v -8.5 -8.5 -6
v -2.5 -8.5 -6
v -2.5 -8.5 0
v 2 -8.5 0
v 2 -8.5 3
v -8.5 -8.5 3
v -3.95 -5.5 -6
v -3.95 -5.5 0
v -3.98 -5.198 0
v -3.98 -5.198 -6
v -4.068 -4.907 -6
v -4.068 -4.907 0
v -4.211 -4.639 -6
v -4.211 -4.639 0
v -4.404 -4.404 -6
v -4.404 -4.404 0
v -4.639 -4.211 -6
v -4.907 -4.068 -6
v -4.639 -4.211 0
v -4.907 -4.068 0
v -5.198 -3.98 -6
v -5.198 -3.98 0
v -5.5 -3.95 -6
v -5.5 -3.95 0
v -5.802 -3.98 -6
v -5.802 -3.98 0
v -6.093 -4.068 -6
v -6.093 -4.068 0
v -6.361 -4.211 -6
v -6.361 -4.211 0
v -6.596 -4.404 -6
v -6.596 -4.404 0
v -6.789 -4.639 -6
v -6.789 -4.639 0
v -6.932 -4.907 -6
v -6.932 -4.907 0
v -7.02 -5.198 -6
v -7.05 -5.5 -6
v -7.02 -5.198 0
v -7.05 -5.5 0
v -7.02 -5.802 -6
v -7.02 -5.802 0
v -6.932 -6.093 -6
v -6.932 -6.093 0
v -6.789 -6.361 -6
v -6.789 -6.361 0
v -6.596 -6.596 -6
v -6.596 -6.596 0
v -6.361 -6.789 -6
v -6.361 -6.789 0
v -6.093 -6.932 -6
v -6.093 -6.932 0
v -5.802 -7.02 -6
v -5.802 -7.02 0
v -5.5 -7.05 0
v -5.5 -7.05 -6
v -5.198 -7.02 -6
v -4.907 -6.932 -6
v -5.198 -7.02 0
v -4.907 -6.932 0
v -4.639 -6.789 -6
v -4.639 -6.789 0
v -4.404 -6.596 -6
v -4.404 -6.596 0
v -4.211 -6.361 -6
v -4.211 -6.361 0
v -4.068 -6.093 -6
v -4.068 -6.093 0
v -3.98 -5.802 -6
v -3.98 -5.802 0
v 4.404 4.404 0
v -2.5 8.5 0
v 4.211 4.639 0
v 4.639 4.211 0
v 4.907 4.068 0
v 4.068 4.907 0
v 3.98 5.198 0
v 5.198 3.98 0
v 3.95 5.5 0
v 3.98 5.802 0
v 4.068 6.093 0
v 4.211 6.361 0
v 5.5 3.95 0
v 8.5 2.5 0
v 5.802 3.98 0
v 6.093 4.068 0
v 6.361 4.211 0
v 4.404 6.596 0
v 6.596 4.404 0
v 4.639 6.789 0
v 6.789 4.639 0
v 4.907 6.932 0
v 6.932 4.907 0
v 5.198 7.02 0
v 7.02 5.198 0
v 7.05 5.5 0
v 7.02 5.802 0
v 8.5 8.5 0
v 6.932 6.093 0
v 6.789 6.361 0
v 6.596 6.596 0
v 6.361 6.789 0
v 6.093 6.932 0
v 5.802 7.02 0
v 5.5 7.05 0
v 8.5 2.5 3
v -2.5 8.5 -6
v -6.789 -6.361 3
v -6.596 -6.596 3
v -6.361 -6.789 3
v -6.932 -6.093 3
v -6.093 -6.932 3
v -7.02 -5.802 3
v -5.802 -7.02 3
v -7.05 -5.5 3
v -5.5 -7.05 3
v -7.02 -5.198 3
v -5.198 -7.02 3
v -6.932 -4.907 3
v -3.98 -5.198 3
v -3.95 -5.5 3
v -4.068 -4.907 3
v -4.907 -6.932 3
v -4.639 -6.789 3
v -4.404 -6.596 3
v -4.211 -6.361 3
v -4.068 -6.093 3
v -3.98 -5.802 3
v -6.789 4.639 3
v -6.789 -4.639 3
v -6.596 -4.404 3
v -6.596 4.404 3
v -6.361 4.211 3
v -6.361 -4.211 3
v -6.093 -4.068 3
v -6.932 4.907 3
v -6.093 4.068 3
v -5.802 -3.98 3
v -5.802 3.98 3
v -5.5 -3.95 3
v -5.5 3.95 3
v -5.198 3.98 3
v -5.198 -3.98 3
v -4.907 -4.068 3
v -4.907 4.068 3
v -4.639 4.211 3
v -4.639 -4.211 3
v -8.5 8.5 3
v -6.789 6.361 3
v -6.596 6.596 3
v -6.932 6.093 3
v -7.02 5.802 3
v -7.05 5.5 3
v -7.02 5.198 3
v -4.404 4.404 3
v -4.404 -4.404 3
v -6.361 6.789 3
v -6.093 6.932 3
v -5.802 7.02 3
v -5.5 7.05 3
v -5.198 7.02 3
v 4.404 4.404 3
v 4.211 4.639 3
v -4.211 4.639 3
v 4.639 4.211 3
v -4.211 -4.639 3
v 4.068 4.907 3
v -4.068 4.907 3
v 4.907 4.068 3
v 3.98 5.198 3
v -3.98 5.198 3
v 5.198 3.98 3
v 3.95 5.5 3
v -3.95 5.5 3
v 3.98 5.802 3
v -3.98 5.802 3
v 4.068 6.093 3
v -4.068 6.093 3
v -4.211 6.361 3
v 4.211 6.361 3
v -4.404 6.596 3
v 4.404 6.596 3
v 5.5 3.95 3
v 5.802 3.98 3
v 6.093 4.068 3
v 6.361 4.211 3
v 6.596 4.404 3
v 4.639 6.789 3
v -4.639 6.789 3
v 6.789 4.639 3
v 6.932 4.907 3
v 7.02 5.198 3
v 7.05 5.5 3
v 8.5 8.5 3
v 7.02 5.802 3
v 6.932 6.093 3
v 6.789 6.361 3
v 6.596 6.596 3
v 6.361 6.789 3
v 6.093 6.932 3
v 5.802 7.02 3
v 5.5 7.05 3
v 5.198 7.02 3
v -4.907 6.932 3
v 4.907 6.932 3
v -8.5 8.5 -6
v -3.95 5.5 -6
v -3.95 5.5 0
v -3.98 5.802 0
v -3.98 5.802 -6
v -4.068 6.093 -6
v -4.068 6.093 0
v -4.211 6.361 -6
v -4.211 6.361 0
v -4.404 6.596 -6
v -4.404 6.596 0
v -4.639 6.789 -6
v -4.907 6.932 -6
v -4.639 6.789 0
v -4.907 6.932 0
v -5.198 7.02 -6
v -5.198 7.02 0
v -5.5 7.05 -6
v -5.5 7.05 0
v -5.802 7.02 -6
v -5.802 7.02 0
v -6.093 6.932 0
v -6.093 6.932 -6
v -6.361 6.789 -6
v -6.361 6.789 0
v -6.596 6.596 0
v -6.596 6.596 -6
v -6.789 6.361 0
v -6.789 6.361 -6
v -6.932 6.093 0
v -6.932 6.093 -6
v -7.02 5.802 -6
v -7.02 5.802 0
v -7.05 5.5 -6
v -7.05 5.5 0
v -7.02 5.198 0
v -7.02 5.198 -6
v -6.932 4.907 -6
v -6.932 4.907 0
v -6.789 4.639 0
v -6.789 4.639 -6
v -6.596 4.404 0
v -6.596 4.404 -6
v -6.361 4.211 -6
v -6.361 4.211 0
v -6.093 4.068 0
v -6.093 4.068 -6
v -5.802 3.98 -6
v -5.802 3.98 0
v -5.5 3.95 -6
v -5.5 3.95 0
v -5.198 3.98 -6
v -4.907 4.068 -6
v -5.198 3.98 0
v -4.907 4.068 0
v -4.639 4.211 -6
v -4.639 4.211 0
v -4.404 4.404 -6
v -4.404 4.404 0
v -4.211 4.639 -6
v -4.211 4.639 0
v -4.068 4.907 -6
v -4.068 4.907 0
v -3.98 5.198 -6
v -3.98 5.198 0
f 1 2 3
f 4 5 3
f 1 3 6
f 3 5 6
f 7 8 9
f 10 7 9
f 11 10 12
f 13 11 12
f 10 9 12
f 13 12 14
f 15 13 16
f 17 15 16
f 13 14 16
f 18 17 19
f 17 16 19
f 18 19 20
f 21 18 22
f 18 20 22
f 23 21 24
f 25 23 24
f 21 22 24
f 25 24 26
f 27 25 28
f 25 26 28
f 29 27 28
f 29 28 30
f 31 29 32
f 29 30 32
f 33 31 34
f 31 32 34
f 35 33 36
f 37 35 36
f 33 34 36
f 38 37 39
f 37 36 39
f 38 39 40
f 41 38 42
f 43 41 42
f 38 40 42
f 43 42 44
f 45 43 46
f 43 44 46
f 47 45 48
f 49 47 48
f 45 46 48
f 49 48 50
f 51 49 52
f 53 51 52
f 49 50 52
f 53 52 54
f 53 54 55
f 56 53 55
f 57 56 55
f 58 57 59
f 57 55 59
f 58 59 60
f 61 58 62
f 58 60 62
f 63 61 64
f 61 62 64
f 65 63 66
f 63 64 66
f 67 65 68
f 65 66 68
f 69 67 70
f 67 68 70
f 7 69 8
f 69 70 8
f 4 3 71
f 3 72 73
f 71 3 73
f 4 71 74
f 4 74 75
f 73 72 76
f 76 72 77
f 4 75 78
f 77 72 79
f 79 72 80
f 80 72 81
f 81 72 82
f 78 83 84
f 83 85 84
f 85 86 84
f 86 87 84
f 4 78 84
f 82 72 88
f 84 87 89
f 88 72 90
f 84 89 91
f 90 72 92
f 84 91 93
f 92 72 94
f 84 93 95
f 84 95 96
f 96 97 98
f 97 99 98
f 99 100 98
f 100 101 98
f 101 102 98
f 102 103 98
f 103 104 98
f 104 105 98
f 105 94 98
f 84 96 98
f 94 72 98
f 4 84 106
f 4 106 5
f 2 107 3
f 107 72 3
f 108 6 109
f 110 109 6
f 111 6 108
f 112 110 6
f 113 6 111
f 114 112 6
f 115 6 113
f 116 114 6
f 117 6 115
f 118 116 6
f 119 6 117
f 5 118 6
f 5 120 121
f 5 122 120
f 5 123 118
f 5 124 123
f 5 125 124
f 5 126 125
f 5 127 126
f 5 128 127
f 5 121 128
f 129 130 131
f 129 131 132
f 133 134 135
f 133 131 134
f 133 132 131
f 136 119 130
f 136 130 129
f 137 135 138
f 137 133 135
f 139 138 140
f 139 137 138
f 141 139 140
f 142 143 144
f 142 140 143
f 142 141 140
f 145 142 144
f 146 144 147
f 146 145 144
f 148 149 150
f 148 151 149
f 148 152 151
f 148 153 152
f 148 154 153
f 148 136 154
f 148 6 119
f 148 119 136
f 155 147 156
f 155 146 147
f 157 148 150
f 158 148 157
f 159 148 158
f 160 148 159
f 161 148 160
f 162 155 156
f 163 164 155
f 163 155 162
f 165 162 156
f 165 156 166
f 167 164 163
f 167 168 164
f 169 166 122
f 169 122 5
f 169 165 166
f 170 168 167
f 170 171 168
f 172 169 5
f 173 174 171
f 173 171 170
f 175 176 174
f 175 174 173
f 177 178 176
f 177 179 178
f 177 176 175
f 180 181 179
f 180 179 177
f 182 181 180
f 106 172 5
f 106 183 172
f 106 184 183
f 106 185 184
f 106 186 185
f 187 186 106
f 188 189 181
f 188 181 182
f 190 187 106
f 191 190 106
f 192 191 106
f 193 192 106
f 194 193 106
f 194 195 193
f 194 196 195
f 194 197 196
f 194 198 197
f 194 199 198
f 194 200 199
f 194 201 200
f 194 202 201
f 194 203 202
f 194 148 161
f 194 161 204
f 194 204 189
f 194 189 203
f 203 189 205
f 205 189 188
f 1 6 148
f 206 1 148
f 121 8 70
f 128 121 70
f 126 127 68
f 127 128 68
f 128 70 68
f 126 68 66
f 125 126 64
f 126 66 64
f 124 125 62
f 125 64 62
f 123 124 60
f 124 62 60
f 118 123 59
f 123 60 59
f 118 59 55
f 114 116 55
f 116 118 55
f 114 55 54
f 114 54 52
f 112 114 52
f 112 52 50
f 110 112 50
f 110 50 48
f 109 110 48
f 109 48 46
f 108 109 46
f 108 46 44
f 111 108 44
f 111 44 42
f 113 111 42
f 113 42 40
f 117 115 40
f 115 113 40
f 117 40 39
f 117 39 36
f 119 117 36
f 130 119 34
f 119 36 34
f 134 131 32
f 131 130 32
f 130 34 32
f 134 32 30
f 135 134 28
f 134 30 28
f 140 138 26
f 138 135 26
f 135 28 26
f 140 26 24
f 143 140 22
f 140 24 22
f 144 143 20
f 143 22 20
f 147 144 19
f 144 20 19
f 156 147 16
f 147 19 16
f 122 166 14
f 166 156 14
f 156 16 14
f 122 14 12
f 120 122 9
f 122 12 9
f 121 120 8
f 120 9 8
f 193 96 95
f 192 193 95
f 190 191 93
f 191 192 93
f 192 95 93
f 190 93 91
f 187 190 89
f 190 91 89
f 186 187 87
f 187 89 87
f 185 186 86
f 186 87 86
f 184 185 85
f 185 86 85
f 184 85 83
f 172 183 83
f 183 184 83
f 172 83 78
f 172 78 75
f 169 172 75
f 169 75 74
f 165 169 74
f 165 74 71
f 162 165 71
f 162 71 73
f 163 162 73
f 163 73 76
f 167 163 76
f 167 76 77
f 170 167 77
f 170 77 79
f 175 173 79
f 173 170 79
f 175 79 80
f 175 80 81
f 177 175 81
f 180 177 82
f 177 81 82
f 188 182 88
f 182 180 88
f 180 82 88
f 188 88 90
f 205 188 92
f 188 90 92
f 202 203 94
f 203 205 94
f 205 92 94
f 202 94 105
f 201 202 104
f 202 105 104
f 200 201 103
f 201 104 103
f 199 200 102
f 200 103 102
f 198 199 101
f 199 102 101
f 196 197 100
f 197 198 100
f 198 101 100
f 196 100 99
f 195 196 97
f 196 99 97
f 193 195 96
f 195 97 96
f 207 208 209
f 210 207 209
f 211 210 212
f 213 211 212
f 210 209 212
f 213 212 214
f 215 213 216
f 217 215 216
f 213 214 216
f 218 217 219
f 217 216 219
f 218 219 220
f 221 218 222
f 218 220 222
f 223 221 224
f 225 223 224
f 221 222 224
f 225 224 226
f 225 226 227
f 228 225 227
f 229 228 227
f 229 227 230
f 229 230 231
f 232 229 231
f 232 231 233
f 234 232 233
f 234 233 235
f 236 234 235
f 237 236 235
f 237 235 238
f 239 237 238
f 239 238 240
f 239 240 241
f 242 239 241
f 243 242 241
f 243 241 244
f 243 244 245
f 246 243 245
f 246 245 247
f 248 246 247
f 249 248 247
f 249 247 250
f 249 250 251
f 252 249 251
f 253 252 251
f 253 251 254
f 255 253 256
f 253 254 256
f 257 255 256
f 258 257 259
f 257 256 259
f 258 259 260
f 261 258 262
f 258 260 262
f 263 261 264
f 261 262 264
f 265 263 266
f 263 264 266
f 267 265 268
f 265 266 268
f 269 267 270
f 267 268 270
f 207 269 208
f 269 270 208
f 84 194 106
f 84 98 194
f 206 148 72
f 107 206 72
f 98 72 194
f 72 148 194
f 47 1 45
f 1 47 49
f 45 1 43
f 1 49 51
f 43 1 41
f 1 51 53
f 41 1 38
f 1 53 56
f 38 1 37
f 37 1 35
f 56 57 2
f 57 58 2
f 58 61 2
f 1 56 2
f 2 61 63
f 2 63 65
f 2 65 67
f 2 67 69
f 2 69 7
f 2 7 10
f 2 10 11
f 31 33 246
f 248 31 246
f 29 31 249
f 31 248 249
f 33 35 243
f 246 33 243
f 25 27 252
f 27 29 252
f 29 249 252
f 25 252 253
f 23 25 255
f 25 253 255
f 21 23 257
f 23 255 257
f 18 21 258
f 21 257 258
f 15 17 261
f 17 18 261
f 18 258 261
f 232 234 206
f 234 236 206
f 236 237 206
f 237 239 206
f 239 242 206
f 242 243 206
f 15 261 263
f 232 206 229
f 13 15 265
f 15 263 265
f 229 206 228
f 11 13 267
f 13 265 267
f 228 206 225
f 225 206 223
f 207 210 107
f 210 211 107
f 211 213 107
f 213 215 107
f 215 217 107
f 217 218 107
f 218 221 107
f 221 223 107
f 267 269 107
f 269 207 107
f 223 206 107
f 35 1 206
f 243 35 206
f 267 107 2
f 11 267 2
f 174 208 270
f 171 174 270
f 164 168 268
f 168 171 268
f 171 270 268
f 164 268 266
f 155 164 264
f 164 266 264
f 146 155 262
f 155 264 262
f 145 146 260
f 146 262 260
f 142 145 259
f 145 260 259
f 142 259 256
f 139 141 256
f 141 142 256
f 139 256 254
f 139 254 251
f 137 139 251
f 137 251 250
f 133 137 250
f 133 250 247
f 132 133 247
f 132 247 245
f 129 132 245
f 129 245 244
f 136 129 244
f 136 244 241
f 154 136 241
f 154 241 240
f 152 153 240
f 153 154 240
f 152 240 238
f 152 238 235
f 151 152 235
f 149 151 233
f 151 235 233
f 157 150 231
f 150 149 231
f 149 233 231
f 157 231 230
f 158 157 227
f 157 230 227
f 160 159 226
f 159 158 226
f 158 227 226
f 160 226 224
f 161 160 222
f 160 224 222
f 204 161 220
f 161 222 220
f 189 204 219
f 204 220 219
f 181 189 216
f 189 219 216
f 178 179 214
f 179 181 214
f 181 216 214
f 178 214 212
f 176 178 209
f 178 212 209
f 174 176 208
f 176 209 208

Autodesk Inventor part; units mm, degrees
ref_plane "YZ Plane" through (0, 0, 0) normal (1, 0, 0) x (0, 1, 0)
ref_plane "XZ Plane" through (0, 0, 0) normal (0, 1, 0) x (-1, 0, 0)
ref_plane "XY Plane" through (0, 0, 0) normal (0, 0, 1) x (1, 0, 0)
sketch "Esquisse1" plane through (0, 0, 0) normal (0, 0, 1) x (1, 0, 0)
  line L0 (5.5, -5.5) -> (-5.5, -5.5) construction
  line L1 (-5.5, -5.5) -> (-5.5, 5.5) construction
  line L2 (-5.5, 5.5) -> (5.5, 5.5) construction
  line L3 (5.5, 5.5) -> (5.5, -5.5) construction
  line L4 (5.5, -5.5) -> (-5.5, 5.5) construction
  line L5 (-5.5, -5.5) -> (5.5, 5.5) construction
  circle A0 centre (-5.5, 5.5) radius 1.55
  circle A1 centre (-5.5, -5.5) radius 1.55
  circle A2 centre (5.5, 5.5) radius 1.55
  line L6 (-2.5, -8.5) -> (-8.5, -8.5)
  line L7 (-8.5, -8.5) -> (-8.5, 8.5)
  line L8 (-8.5, 8.5) -> (-2.5, 8.5)
  line L9 (-2.5, 8.5) -> (-2.5, -8.5)
  line L10 (-2.5, -8.5) -> (-8.5, 8.5) construction
  line L11 (-8.5, -8.5) -> (-2.5, 8.5) construction
  line L12 (8.5, 2.5) -> (-8.5, 2.5)
  line L13 (-8.5, 2.5) -> (-8.5, 8.5)
  line L14 (-8.5, 8.5) -> (8.5, 8.5)
  line L15 (8.5, 8.5) -> (8.5, 2.5)
  line L16 (8.5, 2.5) -> (-8.5, 8.5) construction
  line L17 (-8.5, 2.5) -> (8.5, 8.5) construction
  line L18 (-2.5, -8.5) -> (2, -8.5)
  line L19 (8.5, 2.5) -> (2, -8.5)
  point P0 (0, 0)
  point P1 (-5.5, 0)
  point P2 (0, 5.5)
  point P3 (-2.5, 8.5)
  point P4 (-2.5, 2.5)
  dimension "d0" = 11
  dimension "d1" = 3.1
  dimension "d2" = 6
  dimension "d8" = 4.5
extrude "Extrusion1" add sketch "Esquisse1" against normal blind 6 contours L6 L7 L12 L9 | L12 L7 L8 L9
extrude "Extrusion2" add sketch "Esquisse1" along normal blind 3
properties part number "Support Vis rotation"
